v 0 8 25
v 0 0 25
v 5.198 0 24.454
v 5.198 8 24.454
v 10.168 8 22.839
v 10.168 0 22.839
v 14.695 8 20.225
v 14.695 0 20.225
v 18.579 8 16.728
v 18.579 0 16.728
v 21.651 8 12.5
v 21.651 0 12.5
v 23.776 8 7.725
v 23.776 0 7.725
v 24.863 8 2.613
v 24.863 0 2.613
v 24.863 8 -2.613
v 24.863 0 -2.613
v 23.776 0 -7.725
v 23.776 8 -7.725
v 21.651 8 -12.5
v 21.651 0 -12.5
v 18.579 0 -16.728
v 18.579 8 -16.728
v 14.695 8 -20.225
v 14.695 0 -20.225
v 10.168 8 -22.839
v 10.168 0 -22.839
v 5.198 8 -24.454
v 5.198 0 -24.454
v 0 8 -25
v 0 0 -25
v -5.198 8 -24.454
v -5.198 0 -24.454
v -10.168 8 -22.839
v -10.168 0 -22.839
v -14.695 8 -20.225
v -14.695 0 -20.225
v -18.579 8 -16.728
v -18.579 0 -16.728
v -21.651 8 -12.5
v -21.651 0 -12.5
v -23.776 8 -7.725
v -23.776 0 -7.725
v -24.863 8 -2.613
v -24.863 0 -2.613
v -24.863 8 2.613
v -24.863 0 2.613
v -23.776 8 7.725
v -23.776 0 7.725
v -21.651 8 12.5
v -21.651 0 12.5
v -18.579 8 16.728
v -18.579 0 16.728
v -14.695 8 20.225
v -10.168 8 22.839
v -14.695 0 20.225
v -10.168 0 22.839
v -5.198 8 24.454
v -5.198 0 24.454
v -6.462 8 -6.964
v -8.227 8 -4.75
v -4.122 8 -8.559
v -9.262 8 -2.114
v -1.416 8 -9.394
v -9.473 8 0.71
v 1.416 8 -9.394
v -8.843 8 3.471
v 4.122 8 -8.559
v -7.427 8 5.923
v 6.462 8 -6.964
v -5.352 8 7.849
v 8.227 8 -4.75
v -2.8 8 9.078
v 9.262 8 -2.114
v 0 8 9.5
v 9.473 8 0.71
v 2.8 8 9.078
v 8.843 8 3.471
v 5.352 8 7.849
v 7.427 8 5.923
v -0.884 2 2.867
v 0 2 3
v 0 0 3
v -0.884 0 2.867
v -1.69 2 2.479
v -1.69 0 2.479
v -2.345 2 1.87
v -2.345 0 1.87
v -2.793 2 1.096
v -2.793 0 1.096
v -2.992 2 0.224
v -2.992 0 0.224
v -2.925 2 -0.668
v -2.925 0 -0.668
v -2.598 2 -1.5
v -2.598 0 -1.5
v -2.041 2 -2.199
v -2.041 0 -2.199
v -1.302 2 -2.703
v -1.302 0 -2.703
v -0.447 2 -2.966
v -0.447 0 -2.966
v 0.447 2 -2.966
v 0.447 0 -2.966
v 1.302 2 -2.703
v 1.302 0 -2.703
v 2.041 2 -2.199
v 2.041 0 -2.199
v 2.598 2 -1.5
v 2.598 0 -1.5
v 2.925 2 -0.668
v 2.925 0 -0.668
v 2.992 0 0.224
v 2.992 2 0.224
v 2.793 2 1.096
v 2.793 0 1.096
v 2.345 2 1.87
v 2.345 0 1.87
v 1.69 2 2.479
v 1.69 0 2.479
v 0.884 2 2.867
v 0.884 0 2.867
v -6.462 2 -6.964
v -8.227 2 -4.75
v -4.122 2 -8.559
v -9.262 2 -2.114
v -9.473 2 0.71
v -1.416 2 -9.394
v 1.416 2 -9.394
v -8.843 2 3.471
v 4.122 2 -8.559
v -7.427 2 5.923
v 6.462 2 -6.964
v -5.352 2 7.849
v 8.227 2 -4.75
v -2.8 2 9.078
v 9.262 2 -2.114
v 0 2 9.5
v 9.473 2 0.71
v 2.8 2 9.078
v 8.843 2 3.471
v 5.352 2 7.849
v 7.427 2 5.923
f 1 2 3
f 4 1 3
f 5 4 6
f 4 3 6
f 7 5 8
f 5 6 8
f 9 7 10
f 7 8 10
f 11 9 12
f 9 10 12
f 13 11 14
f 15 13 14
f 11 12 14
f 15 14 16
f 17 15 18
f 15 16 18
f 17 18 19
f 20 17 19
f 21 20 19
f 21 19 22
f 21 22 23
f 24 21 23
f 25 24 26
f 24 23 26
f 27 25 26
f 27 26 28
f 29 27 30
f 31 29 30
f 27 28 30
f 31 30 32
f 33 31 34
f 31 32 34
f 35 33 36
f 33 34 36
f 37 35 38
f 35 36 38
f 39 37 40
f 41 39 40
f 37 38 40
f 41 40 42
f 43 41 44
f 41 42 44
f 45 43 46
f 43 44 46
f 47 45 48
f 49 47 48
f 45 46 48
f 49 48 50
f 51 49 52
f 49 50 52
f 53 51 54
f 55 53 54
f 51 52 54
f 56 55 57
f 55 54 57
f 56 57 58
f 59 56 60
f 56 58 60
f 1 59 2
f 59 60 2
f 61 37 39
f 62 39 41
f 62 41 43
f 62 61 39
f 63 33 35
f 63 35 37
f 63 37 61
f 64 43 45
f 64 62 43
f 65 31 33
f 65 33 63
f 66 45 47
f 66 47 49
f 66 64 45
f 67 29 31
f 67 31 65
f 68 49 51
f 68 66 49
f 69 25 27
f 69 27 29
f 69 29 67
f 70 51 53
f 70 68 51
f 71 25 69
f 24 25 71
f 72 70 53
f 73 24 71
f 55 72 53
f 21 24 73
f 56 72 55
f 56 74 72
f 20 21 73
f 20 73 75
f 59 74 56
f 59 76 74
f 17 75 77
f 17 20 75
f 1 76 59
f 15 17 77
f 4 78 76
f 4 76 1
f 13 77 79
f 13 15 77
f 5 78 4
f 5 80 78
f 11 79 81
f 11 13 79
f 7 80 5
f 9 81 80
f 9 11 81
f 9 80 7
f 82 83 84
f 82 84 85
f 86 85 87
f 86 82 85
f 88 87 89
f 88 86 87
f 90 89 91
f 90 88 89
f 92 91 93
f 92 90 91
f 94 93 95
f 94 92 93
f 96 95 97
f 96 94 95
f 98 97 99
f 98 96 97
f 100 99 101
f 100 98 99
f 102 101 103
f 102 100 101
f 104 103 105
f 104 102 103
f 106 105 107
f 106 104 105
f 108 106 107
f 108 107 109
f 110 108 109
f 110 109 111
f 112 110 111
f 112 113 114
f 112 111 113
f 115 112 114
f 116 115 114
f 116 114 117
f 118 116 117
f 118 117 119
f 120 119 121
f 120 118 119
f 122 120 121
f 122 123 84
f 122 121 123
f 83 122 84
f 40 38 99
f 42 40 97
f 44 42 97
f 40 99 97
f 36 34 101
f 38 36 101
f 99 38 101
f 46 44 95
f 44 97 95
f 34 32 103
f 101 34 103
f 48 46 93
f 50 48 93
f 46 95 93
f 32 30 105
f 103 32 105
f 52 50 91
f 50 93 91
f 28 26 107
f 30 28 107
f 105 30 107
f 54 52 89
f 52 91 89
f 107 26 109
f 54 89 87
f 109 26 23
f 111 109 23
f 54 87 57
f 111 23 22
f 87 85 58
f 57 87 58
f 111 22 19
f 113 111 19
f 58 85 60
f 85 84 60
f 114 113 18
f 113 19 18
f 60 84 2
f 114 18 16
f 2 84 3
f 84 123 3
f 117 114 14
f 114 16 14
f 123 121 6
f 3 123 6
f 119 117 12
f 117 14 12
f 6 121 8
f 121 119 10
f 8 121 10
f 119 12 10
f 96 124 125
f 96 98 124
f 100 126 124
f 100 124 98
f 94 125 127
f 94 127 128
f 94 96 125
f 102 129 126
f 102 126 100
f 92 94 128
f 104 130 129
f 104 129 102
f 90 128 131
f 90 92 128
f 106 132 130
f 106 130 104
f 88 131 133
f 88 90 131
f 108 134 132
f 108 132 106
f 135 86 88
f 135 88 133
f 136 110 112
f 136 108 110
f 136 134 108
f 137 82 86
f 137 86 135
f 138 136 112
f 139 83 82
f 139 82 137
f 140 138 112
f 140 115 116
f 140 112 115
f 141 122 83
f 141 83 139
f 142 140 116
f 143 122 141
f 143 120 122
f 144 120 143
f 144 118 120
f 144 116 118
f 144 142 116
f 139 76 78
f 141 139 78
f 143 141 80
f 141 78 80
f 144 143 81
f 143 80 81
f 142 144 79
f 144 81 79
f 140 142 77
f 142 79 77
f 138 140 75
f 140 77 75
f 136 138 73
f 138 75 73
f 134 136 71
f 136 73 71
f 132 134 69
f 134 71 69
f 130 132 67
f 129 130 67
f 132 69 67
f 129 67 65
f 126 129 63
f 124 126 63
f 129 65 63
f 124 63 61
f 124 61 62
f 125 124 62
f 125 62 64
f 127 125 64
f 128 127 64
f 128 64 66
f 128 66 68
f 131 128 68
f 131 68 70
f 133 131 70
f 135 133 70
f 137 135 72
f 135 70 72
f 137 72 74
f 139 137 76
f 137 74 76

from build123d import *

# Parameters (mm, degrees)
ESQUISSE1_R                  = 25
BOSS_EXTRU_1_DEPTH           = 8
ESQUISSE2_R                  = 9.5
ENL_V_MAT_EXTRU_1_DEPTH      = 6
ENL_V_MAT_EXTRU_2_DEPTH      = 37.249137921
ENL_V_MAT_EXTRU_2_DEPTH_BACK = 37.249137921
ESQUISSE4_R                  = 3


with BuildPart() as part:
    # Esquisse1 → Boss.-Extru.1 (new body)
    with BuildSketch(Plane(origin=(0, 0, 0), x_dir=(1, 0, 0), z_dir=(0, 1, 0))):
        with Locations(Location((0, 0, 0), (0, 0, 270))):
            Circle(ESQUISSE1_R)
    extrude(amount=BOSS_EXTRU_1_DEPTH)

    # Esquisse2 → Enlèv. mat.-Extru.1 (cut)
    with BuildSketch(Plane(origin=(0, 8, 0), x_dir=(1, 0, 0), z_dir=(0, 1, 0))):
        with Locations(Location((0, 0, 0), (0, 0, 270))):
            Circle(ESQUISSE2_R)
    extrude(amount=-ENL_V_MAT_EXTRU_1_DEPTH, mode=Mode.SUBTRACT)

    # Esquisse4 → Enlèv. mat.-Extru.2 (cut, two sides: drawn at the far end of the back side and taken through both)
    with BuildSketch(Plane.XZ.offset(-ENL_V_MAT_EXTRU_2_DEPTH_BACK)):
        with Locations(Location((0, 0, 0), (0, 0, 90))):
            Circle(ESQUISSE4_R)
    extrude(amount=ENL_V_MAT_EXTRU_2_DEPTH + ENL_V_MAT_EXTRU_2_DEPTH_BACK, mode=Mode.SUBTRACT)


solid = part.part
